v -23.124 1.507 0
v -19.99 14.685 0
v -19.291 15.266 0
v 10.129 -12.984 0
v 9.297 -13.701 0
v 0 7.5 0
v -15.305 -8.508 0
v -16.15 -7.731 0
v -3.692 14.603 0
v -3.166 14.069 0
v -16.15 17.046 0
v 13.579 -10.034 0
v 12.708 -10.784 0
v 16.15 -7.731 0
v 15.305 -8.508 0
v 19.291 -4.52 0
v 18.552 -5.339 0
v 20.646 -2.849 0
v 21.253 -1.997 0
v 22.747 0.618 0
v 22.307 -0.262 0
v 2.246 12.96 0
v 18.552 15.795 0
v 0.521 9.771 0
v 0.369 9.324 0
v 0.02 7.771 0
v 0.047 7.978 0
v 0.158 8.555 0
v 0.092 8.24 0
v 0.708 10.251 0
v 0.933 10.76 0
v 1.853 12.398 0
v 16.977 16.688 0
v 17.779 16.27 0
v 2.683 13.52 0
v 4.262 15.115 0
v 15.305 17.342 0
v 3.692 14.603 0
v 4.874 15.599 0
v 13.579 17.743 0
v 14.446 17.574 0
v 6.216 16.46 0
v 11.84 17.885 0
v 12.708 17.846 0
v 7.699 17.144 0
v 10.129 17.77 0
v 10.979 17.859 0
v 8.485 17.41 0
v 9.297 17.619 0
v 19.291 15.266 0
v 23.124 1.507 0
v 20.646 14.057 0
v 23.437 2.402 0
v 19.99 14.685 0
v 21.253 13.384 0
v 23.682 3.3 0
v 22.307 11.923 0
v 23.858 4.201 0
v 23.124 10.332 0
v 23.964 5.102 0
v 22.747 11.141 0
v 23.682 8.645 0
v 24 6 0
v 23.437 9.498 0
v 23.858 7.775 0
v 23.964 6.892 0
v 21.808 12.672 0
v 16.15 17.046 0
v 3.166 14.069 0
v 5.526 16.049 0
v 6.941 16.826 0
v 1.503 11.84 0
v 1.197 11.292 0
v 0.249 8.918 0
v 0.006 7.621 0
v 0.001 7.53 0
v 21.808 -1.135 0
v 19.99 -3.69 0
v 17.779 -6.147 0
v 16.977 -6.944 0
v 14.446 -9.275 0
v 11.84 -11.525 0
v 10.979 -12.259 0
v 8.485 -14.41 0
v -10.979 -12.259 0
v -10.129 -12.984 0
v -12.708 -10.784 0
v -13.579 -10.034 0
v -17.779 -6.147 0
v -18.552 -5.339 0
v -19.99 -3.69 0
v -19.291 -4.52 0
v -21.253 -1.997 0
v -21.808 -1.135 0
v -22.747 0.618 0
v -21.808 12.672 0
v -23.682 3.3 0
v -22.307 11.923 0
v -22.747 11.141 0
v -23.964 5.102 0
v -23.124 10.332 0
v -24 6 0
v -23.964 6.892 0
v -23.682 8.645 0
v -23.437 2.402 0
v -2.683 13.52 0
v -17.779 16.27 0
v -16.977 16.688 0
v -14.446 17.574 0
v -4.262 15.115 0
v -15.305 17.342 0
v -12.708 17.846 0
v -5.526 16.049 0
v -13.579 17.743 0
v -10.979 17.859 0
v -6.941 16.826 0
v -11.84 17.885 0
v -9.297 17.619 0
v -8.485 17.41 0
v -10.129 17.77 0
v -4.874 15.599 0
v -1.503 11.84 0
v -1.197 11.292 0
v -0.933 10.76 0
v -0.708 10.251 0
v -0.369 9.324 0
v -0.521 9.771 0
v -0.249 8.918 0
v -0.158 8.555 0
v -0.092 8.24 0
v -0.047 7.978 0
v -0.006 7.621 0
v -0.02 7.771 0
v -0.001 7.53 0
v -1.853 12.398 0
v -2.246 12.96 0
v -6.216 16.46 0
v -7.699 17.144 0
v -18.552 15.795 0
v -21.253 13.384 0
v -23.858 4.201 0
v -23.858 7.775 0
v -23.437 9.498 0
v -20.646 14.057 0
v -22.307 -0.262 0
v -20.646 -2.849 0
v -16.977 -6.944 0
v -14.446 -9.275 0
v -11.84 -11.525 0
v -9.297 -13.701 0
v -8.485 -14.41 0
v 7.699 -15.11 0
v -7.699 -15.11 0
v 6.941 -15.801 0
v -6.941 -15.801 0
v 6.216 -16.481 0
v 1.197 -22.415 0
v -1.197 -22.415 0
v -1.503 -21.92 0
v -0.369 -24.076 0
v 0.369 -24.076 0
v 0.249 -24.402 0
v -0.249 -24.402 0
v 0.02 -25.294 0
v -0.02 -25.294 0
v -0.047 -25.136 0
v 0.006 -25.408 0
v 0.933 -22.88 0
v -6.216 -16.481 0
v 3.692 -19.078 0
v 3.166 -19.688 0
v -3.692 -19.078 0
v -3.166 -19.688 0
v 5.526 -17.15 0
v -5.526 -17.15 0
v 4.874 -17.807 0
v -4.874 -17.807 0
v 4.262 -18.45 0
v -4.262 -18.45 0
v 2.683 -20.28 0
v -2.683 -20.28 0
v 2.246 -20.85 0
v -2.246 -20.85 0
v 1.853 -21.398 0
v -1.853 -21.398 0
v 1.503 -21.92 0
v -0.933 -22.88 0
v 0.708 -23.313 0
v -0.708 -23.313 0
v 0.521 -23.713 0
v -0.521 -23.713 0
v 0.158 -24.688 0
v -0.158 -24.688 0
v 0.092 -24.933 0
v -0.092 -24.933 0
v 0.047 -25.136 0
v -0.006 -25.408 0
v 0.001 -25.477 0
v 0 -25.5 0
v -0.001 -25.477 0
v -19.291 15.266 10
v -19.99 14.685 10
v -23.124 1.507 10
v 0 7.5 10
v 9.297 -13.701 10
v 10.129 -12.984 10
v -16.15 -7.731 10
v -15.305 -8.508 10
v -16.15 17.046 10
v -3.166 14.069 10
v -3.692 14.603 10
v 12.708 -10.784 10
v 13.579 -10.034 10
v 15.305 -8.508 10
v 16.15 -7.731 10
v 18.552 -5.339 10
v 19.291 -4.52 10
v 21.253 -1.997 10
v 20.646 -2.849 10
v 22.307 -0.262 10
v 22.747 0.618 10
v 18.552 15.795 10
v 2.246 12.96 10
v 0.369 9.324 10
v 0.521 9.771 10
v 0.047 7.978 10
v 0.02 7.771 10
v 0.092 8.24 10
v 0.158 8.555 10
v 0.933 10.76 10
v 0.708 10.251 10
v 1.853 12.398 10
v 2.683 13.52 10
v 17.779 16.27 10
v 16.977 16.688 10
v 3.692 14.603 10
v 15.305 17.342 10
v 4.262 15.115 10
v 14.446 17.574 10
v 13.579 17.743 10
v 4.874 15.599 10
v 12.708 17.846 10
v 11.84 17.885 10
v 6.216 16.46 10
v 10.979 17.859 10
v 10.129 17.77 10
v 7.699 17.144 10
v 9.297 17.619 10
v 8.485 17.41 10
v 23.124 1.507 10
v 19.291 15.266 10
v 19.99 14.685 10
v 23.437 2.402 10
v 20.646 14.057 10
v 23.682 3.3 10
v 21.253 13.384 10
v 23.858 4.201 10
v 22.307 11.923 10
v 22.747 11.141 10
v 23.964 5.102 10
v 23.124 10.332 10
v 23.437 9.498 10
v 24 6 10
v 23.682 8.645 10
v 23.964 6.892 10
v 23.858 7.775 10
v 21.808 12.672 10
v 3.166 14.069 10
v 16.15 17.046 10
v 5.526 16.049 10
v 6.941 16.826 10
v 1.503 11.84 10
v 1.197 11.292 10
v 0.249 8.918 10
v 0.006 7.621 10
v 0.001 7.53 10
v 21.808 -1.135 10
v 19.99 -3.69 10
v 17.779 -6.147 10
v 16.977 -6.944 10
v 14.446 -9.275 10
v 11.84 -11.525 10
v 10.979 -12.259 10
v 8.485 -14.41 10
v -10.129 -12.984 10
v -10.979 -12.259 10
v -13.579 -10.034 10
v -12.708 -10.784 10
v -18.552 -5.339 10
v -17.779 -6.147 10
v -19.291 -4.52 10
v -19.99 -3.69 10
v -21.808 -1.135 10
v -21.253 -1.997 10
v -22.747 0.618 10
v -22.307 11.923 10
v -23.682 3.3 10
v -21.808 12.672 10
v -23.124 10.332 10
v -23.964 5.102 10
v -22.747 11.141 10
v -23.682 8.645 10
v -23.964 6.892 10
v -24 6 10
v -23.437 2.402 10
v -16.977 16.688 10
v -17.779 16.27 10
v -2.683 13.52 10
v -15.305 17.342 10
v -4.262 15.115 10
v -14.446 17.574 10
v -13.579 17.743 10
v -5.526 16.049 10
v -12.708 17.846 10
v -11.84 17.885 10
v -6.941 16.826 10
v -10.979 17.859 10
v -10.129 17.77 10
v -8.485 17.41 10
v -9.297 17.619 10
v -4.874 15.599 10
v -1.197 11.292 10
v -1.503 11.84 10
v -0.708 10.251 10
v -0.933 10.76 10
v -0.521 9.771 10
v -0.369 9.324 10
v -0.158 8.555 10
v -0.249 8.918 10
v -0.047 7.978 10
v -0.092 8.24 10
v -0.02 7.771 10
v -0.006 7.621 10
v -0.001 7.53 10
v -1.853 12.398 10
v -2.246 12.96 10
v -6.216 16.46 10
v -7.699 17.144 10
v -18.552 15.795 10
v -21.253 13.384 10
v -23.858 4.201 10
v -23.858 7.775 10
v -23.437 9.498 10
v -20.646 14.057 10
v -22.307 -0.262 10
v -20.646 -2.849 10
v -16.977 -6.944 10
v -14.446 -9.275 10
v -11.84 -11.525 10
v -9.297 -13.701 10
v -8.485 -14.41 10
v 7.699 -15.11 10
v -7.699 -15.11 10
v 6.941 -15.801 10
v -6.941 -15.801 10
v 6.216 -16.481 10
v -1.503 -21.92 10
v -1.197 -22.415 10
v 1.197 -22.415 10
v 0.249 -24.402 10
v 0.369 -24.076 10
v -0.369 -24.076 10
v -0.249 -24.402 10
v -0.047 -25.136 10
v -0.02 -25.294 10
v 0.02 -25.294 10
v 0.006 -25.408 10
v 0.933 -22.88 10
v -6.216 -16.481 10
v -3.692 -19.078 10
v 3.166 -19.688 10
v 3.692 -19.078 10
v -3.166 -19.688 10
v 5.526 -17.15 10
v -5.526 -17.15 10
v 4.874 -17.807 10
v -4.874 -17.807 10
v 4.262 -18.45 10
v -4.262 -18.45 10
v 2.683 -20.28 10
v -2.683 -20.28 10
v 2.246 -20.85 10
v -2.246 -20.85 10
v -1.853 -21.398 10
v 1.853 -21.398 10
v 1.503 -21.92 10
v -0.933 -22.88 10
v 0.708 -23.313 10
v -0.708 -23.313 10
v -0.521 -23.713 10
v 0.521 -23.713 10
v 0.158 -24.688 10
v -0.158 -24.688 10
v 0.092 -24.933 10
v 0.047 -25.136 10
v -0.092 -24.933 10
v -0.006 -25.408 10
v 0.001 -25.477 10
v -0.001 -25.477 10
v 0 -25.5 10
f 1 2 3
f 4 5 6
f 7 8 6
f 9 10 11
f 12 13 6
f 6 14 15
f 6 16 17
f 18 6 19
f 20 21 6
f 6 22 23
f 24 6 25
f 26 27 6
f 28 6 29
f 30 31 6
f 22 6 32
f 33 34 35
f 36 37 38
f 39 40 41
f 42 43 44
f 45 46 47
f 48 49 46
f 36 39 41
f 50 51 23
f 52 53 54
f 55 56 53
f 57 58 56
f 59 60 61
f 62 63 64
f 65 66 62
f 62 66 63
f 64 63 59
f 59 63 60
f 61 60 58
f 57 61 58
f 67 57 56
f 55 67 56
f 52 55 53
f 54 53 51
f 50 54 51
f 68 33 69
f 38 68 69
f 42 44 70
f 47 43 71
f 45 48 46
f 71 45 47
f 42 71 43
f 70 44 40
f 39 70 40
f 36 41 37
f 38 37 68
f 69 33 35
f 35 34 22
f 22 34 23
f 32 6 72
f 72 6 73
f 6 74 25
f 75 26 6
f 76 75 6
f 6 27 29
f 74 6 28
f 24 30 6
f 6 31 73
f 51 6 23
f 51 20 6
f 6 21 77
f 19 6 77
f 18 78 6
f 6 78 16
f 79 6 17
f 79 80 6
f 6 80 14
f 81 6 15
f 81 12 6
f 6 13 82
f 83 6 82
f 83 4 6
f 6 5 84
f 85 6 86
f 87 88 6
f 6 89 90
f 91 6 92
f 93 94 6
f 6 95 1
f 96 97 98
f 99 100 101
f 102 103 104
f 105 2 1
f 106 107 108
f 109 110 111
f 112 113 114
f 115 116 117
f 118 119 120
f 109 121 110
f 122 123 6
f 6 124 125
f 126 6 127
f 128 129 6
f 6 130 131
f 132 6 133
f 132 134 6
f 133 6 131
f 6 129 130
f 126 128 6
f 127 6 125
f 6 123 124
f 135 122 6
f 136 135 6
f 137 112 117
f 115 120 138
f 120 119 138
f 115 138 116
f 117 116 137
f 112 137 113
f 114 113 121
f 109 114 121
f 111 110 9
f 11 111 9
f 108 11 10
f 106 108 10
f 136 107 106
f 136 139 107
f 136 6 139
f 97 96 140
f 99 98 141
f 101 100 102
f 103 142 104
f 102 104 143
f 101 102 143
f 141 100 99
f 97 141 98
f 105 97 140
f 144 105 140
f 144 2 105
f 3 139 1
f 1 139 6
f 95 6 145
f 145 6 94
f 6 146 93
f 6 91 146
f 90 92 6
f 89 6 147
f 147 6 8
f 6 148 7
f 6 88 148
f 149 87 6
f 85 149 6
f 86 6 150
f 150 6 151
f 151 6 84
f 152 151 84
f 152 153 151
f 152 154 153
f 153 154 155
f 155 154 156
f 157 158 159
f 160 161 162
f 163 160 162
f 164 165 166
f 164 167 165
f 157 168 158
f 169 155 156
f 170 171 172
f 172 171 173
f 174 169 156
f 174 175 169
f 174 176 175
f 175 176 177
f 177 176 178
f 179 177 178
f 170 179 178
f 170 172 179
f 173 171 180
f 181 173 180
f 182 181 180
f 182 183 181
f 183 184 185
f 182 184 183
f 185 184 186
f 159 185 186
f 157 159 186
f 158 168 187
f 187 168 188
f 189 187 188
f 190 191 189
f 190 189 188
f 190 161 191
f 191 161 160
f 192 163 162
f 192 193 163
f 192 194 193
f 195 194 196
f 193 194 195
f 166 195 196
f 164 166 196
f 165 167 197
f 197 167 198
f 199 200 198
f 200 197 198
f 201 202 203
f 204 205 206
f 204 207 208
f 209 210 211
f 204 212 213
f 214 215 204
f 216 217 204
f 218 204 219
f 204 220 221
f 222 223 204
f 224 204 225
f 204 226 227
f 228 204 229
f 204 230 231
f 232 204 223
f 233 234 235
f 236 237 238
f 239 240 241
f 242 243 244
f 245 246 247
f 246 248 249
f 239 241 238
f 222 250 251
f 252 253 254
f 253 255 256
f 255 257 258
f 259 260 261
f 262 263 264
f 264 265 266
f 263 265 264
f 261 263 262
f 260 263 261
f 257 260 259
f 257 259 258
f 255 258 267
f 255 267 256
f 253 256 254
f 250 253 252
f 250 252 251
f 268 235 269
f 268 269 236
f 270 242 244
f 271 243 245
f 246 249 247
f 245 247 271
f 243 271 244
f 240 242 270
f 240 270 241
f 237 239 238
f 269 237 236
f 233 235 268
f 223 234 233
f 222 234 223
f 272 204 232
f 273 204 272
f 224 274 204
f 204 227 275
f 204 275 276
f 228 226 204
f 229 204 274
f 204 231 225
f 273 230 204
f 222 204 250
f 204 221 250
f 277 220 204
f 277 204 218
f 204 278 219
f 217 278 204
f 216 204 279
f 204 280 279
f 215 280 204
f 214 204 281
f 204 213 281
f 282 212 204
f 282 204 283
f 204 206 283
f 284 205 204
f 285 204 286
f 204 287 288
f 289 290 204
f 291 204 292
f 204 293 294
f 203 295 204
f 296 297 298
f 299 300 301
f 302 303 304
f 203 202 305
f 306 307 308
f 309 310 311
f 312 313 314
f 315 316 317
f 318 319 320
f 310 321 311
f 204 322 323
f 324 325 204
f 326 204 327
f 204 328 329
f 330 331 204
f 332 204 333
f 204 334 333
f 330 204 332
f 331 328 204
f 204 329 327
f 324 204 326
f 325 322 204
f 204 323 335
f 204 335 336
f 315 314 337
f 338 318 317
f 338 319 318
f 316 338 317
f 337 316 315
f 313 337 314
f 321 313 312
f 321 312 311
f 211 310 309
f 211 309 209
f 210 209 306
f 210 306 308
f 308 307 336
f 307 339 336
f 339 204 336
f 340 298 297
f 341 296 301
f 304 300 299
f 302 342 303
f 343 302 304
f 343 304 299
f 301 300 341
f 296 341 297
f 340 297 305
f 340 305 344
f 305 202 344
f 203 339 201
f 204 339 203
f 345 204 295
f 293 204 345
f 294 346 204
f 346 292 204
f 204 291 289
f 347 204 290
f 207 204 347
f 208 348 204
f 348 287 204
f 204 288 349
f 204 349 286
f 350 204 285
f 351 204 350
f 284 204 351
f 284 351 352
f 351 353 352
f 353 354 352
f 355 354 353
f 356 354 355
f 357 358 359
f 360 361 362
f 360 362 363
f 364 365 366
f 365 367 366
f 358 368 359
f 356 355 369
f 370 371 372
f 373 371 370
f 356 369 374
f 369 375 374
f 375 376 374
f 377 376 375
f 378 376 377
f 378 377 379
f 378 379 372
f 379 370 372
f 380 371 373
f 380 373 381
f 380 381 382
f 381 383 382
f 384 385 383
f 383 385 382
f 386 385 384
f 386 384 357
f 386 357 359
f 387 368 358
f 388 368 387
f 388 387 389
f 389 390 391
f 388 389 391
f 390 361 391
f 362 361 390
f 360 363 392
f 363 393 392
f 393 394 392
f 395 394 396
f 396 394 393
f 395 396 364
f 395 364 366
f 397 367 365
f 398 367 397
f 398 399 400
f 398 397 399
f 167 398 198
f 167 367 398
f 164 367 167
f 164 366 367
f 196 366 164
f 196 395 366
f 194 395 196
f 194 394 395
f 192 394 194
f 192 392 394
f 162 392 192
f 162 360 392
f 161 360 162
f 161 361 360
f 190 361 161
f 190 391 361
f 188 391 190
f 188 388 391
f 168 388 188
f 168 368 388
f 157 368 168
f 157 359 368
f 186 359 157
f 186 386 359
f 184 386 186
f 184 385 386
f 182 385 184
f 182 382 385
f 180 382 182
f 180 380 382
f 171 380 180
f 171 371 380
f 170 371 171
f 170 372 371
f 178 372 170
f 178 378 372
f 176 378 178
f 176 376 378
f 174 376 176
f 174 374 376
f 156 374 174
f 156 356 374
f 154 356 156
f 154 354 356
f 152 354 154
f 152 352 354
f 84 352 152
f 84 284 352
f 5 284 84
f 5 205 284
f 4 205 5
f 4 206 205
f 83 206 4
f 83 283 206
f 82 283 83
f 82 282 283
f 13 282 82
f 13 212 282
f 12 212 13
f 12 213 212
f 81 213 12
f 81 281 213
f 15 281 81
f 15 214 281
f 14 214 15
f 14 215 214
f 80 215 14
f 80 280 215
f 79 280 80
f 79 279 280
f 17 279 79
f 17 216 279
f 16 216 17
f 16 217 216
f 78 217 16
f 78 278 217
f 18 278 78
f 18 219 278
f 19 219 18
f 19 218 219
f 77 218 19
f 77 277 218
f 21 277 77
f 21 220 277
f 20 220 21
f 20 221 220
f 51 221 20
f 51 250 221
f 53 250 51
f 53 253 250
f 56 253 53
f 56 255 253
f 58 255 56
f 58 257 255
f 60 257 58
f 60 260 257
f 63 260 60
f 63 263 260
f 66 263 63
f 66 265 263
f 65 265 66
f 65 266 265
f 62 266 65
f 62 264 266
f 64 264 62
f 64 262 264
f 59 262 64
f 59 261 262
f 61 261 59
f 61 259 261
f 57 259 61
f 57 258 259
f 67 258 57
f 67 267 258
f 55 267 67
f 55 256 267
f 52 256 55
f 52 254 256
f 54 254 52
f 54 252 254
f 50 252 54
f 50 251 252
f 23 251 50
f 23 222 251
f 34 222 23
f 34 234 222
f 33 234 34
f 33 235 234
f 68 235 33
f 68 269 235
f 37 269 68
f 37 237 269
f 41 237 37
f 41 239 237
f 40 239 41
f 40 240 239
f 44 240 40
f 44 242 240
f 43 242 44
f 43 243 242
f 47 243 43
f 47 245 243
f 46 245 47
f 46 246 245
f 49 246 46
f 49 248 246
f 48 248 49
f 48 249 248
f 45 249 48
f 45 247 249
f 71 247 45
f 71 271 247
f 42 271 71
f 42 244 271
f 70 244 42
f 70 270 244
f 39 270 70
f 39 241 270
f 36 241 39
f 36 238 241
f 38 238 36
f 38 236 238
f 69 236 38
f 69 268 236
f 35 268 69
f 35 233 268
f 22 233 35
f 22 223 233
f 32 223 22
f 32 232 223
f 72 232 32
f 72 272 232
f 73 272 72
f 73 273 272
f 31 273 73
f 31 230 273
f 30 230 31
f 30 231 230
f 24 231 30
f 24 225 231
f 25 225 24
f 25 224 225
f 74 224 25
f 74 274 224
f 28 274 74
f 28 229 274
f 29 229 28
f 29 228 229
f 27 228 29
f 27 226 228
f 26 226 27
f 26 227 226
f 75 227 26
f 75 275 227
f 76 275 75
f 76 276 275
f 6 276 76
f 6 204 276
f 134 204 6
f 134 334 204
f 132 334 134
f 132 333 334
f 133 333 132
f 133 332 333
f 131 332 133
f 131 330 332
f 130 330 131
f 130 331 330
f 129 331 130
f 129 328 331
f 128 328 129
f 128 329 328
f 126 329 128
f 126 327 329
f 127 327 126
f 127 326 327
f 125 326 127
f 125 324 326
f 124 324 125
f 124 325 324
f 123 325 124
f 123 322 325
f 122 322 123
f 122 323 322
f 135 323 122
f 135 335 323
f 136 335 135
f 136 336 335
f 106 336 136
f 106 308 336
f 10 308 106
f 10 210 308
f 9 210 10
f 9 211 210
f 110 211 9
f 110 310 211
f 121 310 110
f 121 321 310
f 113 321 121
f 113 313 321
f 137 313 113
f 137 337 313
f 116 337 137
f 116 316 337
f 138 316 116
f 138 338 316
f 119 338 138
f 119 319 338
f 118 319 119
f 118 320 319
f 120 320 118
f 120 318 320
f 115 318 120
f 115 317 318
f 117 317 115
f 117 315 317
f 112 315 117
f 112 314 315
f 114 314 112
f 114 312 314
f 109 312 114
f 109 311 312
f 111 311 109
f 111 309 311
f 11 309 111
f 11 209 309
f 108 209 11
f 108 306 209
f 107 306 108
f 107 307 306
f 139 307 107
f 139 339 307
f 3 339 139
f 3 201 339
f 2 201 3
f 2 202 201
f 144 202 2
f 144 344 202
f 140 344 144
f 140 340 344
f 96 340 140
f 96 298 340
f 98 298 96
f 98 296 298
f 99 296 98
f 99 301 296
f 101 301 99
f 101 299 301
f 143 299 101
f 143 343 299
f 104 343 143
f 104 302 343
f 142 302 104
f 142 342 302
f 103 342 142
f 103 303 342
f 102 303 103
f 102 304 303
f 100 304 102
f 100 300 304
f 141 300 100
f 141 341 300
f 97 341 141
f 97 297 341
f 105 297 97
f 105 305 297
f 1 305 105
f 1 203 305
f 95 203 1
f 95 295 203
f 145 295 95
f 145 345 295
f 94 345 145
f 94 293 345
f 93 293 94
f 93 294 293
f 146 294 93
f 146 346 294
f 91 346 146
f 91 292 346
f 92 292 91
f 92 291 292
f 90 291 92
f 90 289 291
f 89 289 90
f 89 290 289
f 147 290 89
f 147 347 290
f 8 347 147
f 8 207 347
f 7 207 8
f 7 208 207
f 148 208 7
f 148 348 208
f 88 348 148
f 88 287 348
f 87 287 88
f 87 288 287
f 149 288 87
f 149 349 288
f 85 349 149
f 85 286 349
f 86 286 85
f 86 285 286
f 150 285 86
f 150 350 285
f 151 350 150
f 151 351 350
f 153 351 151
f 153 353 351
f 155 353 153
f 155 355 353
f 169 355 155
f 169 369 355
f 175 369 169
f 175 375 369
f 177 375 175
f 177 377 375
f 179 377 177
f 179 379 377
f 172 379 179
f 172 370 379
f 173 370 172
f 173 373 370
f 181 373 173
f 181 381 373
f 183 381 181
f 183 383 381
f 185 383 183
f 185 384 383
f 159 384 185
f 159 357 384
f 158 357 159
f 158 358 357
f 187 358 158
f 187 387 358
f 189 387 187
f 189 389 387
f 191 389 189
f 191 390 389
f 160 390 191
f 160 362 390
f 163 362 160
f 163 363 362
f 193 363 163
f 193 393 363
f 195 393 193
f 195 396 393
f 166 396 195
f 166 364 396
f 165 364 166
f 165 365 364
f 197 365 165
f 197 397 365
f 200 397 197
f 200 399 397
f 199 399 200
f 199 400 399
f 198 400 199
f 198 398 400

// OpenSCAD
module heart2d(scale=1, steps=200) {
    points = [
        for (i = [0:steps])
            let(t = 360 * i / steps)
            [
                scale * 16 * pow(sin(t), 3),
                scale * (
                    13*cos(t)
                    - 5*cos(2*t)
                    - 2*cos(3*t)
                    - cos(4*t)
                )
            ]
    ];
    polygon(points);
}

linear_extrude(height=10)
    heart2d(scale=1.5);
